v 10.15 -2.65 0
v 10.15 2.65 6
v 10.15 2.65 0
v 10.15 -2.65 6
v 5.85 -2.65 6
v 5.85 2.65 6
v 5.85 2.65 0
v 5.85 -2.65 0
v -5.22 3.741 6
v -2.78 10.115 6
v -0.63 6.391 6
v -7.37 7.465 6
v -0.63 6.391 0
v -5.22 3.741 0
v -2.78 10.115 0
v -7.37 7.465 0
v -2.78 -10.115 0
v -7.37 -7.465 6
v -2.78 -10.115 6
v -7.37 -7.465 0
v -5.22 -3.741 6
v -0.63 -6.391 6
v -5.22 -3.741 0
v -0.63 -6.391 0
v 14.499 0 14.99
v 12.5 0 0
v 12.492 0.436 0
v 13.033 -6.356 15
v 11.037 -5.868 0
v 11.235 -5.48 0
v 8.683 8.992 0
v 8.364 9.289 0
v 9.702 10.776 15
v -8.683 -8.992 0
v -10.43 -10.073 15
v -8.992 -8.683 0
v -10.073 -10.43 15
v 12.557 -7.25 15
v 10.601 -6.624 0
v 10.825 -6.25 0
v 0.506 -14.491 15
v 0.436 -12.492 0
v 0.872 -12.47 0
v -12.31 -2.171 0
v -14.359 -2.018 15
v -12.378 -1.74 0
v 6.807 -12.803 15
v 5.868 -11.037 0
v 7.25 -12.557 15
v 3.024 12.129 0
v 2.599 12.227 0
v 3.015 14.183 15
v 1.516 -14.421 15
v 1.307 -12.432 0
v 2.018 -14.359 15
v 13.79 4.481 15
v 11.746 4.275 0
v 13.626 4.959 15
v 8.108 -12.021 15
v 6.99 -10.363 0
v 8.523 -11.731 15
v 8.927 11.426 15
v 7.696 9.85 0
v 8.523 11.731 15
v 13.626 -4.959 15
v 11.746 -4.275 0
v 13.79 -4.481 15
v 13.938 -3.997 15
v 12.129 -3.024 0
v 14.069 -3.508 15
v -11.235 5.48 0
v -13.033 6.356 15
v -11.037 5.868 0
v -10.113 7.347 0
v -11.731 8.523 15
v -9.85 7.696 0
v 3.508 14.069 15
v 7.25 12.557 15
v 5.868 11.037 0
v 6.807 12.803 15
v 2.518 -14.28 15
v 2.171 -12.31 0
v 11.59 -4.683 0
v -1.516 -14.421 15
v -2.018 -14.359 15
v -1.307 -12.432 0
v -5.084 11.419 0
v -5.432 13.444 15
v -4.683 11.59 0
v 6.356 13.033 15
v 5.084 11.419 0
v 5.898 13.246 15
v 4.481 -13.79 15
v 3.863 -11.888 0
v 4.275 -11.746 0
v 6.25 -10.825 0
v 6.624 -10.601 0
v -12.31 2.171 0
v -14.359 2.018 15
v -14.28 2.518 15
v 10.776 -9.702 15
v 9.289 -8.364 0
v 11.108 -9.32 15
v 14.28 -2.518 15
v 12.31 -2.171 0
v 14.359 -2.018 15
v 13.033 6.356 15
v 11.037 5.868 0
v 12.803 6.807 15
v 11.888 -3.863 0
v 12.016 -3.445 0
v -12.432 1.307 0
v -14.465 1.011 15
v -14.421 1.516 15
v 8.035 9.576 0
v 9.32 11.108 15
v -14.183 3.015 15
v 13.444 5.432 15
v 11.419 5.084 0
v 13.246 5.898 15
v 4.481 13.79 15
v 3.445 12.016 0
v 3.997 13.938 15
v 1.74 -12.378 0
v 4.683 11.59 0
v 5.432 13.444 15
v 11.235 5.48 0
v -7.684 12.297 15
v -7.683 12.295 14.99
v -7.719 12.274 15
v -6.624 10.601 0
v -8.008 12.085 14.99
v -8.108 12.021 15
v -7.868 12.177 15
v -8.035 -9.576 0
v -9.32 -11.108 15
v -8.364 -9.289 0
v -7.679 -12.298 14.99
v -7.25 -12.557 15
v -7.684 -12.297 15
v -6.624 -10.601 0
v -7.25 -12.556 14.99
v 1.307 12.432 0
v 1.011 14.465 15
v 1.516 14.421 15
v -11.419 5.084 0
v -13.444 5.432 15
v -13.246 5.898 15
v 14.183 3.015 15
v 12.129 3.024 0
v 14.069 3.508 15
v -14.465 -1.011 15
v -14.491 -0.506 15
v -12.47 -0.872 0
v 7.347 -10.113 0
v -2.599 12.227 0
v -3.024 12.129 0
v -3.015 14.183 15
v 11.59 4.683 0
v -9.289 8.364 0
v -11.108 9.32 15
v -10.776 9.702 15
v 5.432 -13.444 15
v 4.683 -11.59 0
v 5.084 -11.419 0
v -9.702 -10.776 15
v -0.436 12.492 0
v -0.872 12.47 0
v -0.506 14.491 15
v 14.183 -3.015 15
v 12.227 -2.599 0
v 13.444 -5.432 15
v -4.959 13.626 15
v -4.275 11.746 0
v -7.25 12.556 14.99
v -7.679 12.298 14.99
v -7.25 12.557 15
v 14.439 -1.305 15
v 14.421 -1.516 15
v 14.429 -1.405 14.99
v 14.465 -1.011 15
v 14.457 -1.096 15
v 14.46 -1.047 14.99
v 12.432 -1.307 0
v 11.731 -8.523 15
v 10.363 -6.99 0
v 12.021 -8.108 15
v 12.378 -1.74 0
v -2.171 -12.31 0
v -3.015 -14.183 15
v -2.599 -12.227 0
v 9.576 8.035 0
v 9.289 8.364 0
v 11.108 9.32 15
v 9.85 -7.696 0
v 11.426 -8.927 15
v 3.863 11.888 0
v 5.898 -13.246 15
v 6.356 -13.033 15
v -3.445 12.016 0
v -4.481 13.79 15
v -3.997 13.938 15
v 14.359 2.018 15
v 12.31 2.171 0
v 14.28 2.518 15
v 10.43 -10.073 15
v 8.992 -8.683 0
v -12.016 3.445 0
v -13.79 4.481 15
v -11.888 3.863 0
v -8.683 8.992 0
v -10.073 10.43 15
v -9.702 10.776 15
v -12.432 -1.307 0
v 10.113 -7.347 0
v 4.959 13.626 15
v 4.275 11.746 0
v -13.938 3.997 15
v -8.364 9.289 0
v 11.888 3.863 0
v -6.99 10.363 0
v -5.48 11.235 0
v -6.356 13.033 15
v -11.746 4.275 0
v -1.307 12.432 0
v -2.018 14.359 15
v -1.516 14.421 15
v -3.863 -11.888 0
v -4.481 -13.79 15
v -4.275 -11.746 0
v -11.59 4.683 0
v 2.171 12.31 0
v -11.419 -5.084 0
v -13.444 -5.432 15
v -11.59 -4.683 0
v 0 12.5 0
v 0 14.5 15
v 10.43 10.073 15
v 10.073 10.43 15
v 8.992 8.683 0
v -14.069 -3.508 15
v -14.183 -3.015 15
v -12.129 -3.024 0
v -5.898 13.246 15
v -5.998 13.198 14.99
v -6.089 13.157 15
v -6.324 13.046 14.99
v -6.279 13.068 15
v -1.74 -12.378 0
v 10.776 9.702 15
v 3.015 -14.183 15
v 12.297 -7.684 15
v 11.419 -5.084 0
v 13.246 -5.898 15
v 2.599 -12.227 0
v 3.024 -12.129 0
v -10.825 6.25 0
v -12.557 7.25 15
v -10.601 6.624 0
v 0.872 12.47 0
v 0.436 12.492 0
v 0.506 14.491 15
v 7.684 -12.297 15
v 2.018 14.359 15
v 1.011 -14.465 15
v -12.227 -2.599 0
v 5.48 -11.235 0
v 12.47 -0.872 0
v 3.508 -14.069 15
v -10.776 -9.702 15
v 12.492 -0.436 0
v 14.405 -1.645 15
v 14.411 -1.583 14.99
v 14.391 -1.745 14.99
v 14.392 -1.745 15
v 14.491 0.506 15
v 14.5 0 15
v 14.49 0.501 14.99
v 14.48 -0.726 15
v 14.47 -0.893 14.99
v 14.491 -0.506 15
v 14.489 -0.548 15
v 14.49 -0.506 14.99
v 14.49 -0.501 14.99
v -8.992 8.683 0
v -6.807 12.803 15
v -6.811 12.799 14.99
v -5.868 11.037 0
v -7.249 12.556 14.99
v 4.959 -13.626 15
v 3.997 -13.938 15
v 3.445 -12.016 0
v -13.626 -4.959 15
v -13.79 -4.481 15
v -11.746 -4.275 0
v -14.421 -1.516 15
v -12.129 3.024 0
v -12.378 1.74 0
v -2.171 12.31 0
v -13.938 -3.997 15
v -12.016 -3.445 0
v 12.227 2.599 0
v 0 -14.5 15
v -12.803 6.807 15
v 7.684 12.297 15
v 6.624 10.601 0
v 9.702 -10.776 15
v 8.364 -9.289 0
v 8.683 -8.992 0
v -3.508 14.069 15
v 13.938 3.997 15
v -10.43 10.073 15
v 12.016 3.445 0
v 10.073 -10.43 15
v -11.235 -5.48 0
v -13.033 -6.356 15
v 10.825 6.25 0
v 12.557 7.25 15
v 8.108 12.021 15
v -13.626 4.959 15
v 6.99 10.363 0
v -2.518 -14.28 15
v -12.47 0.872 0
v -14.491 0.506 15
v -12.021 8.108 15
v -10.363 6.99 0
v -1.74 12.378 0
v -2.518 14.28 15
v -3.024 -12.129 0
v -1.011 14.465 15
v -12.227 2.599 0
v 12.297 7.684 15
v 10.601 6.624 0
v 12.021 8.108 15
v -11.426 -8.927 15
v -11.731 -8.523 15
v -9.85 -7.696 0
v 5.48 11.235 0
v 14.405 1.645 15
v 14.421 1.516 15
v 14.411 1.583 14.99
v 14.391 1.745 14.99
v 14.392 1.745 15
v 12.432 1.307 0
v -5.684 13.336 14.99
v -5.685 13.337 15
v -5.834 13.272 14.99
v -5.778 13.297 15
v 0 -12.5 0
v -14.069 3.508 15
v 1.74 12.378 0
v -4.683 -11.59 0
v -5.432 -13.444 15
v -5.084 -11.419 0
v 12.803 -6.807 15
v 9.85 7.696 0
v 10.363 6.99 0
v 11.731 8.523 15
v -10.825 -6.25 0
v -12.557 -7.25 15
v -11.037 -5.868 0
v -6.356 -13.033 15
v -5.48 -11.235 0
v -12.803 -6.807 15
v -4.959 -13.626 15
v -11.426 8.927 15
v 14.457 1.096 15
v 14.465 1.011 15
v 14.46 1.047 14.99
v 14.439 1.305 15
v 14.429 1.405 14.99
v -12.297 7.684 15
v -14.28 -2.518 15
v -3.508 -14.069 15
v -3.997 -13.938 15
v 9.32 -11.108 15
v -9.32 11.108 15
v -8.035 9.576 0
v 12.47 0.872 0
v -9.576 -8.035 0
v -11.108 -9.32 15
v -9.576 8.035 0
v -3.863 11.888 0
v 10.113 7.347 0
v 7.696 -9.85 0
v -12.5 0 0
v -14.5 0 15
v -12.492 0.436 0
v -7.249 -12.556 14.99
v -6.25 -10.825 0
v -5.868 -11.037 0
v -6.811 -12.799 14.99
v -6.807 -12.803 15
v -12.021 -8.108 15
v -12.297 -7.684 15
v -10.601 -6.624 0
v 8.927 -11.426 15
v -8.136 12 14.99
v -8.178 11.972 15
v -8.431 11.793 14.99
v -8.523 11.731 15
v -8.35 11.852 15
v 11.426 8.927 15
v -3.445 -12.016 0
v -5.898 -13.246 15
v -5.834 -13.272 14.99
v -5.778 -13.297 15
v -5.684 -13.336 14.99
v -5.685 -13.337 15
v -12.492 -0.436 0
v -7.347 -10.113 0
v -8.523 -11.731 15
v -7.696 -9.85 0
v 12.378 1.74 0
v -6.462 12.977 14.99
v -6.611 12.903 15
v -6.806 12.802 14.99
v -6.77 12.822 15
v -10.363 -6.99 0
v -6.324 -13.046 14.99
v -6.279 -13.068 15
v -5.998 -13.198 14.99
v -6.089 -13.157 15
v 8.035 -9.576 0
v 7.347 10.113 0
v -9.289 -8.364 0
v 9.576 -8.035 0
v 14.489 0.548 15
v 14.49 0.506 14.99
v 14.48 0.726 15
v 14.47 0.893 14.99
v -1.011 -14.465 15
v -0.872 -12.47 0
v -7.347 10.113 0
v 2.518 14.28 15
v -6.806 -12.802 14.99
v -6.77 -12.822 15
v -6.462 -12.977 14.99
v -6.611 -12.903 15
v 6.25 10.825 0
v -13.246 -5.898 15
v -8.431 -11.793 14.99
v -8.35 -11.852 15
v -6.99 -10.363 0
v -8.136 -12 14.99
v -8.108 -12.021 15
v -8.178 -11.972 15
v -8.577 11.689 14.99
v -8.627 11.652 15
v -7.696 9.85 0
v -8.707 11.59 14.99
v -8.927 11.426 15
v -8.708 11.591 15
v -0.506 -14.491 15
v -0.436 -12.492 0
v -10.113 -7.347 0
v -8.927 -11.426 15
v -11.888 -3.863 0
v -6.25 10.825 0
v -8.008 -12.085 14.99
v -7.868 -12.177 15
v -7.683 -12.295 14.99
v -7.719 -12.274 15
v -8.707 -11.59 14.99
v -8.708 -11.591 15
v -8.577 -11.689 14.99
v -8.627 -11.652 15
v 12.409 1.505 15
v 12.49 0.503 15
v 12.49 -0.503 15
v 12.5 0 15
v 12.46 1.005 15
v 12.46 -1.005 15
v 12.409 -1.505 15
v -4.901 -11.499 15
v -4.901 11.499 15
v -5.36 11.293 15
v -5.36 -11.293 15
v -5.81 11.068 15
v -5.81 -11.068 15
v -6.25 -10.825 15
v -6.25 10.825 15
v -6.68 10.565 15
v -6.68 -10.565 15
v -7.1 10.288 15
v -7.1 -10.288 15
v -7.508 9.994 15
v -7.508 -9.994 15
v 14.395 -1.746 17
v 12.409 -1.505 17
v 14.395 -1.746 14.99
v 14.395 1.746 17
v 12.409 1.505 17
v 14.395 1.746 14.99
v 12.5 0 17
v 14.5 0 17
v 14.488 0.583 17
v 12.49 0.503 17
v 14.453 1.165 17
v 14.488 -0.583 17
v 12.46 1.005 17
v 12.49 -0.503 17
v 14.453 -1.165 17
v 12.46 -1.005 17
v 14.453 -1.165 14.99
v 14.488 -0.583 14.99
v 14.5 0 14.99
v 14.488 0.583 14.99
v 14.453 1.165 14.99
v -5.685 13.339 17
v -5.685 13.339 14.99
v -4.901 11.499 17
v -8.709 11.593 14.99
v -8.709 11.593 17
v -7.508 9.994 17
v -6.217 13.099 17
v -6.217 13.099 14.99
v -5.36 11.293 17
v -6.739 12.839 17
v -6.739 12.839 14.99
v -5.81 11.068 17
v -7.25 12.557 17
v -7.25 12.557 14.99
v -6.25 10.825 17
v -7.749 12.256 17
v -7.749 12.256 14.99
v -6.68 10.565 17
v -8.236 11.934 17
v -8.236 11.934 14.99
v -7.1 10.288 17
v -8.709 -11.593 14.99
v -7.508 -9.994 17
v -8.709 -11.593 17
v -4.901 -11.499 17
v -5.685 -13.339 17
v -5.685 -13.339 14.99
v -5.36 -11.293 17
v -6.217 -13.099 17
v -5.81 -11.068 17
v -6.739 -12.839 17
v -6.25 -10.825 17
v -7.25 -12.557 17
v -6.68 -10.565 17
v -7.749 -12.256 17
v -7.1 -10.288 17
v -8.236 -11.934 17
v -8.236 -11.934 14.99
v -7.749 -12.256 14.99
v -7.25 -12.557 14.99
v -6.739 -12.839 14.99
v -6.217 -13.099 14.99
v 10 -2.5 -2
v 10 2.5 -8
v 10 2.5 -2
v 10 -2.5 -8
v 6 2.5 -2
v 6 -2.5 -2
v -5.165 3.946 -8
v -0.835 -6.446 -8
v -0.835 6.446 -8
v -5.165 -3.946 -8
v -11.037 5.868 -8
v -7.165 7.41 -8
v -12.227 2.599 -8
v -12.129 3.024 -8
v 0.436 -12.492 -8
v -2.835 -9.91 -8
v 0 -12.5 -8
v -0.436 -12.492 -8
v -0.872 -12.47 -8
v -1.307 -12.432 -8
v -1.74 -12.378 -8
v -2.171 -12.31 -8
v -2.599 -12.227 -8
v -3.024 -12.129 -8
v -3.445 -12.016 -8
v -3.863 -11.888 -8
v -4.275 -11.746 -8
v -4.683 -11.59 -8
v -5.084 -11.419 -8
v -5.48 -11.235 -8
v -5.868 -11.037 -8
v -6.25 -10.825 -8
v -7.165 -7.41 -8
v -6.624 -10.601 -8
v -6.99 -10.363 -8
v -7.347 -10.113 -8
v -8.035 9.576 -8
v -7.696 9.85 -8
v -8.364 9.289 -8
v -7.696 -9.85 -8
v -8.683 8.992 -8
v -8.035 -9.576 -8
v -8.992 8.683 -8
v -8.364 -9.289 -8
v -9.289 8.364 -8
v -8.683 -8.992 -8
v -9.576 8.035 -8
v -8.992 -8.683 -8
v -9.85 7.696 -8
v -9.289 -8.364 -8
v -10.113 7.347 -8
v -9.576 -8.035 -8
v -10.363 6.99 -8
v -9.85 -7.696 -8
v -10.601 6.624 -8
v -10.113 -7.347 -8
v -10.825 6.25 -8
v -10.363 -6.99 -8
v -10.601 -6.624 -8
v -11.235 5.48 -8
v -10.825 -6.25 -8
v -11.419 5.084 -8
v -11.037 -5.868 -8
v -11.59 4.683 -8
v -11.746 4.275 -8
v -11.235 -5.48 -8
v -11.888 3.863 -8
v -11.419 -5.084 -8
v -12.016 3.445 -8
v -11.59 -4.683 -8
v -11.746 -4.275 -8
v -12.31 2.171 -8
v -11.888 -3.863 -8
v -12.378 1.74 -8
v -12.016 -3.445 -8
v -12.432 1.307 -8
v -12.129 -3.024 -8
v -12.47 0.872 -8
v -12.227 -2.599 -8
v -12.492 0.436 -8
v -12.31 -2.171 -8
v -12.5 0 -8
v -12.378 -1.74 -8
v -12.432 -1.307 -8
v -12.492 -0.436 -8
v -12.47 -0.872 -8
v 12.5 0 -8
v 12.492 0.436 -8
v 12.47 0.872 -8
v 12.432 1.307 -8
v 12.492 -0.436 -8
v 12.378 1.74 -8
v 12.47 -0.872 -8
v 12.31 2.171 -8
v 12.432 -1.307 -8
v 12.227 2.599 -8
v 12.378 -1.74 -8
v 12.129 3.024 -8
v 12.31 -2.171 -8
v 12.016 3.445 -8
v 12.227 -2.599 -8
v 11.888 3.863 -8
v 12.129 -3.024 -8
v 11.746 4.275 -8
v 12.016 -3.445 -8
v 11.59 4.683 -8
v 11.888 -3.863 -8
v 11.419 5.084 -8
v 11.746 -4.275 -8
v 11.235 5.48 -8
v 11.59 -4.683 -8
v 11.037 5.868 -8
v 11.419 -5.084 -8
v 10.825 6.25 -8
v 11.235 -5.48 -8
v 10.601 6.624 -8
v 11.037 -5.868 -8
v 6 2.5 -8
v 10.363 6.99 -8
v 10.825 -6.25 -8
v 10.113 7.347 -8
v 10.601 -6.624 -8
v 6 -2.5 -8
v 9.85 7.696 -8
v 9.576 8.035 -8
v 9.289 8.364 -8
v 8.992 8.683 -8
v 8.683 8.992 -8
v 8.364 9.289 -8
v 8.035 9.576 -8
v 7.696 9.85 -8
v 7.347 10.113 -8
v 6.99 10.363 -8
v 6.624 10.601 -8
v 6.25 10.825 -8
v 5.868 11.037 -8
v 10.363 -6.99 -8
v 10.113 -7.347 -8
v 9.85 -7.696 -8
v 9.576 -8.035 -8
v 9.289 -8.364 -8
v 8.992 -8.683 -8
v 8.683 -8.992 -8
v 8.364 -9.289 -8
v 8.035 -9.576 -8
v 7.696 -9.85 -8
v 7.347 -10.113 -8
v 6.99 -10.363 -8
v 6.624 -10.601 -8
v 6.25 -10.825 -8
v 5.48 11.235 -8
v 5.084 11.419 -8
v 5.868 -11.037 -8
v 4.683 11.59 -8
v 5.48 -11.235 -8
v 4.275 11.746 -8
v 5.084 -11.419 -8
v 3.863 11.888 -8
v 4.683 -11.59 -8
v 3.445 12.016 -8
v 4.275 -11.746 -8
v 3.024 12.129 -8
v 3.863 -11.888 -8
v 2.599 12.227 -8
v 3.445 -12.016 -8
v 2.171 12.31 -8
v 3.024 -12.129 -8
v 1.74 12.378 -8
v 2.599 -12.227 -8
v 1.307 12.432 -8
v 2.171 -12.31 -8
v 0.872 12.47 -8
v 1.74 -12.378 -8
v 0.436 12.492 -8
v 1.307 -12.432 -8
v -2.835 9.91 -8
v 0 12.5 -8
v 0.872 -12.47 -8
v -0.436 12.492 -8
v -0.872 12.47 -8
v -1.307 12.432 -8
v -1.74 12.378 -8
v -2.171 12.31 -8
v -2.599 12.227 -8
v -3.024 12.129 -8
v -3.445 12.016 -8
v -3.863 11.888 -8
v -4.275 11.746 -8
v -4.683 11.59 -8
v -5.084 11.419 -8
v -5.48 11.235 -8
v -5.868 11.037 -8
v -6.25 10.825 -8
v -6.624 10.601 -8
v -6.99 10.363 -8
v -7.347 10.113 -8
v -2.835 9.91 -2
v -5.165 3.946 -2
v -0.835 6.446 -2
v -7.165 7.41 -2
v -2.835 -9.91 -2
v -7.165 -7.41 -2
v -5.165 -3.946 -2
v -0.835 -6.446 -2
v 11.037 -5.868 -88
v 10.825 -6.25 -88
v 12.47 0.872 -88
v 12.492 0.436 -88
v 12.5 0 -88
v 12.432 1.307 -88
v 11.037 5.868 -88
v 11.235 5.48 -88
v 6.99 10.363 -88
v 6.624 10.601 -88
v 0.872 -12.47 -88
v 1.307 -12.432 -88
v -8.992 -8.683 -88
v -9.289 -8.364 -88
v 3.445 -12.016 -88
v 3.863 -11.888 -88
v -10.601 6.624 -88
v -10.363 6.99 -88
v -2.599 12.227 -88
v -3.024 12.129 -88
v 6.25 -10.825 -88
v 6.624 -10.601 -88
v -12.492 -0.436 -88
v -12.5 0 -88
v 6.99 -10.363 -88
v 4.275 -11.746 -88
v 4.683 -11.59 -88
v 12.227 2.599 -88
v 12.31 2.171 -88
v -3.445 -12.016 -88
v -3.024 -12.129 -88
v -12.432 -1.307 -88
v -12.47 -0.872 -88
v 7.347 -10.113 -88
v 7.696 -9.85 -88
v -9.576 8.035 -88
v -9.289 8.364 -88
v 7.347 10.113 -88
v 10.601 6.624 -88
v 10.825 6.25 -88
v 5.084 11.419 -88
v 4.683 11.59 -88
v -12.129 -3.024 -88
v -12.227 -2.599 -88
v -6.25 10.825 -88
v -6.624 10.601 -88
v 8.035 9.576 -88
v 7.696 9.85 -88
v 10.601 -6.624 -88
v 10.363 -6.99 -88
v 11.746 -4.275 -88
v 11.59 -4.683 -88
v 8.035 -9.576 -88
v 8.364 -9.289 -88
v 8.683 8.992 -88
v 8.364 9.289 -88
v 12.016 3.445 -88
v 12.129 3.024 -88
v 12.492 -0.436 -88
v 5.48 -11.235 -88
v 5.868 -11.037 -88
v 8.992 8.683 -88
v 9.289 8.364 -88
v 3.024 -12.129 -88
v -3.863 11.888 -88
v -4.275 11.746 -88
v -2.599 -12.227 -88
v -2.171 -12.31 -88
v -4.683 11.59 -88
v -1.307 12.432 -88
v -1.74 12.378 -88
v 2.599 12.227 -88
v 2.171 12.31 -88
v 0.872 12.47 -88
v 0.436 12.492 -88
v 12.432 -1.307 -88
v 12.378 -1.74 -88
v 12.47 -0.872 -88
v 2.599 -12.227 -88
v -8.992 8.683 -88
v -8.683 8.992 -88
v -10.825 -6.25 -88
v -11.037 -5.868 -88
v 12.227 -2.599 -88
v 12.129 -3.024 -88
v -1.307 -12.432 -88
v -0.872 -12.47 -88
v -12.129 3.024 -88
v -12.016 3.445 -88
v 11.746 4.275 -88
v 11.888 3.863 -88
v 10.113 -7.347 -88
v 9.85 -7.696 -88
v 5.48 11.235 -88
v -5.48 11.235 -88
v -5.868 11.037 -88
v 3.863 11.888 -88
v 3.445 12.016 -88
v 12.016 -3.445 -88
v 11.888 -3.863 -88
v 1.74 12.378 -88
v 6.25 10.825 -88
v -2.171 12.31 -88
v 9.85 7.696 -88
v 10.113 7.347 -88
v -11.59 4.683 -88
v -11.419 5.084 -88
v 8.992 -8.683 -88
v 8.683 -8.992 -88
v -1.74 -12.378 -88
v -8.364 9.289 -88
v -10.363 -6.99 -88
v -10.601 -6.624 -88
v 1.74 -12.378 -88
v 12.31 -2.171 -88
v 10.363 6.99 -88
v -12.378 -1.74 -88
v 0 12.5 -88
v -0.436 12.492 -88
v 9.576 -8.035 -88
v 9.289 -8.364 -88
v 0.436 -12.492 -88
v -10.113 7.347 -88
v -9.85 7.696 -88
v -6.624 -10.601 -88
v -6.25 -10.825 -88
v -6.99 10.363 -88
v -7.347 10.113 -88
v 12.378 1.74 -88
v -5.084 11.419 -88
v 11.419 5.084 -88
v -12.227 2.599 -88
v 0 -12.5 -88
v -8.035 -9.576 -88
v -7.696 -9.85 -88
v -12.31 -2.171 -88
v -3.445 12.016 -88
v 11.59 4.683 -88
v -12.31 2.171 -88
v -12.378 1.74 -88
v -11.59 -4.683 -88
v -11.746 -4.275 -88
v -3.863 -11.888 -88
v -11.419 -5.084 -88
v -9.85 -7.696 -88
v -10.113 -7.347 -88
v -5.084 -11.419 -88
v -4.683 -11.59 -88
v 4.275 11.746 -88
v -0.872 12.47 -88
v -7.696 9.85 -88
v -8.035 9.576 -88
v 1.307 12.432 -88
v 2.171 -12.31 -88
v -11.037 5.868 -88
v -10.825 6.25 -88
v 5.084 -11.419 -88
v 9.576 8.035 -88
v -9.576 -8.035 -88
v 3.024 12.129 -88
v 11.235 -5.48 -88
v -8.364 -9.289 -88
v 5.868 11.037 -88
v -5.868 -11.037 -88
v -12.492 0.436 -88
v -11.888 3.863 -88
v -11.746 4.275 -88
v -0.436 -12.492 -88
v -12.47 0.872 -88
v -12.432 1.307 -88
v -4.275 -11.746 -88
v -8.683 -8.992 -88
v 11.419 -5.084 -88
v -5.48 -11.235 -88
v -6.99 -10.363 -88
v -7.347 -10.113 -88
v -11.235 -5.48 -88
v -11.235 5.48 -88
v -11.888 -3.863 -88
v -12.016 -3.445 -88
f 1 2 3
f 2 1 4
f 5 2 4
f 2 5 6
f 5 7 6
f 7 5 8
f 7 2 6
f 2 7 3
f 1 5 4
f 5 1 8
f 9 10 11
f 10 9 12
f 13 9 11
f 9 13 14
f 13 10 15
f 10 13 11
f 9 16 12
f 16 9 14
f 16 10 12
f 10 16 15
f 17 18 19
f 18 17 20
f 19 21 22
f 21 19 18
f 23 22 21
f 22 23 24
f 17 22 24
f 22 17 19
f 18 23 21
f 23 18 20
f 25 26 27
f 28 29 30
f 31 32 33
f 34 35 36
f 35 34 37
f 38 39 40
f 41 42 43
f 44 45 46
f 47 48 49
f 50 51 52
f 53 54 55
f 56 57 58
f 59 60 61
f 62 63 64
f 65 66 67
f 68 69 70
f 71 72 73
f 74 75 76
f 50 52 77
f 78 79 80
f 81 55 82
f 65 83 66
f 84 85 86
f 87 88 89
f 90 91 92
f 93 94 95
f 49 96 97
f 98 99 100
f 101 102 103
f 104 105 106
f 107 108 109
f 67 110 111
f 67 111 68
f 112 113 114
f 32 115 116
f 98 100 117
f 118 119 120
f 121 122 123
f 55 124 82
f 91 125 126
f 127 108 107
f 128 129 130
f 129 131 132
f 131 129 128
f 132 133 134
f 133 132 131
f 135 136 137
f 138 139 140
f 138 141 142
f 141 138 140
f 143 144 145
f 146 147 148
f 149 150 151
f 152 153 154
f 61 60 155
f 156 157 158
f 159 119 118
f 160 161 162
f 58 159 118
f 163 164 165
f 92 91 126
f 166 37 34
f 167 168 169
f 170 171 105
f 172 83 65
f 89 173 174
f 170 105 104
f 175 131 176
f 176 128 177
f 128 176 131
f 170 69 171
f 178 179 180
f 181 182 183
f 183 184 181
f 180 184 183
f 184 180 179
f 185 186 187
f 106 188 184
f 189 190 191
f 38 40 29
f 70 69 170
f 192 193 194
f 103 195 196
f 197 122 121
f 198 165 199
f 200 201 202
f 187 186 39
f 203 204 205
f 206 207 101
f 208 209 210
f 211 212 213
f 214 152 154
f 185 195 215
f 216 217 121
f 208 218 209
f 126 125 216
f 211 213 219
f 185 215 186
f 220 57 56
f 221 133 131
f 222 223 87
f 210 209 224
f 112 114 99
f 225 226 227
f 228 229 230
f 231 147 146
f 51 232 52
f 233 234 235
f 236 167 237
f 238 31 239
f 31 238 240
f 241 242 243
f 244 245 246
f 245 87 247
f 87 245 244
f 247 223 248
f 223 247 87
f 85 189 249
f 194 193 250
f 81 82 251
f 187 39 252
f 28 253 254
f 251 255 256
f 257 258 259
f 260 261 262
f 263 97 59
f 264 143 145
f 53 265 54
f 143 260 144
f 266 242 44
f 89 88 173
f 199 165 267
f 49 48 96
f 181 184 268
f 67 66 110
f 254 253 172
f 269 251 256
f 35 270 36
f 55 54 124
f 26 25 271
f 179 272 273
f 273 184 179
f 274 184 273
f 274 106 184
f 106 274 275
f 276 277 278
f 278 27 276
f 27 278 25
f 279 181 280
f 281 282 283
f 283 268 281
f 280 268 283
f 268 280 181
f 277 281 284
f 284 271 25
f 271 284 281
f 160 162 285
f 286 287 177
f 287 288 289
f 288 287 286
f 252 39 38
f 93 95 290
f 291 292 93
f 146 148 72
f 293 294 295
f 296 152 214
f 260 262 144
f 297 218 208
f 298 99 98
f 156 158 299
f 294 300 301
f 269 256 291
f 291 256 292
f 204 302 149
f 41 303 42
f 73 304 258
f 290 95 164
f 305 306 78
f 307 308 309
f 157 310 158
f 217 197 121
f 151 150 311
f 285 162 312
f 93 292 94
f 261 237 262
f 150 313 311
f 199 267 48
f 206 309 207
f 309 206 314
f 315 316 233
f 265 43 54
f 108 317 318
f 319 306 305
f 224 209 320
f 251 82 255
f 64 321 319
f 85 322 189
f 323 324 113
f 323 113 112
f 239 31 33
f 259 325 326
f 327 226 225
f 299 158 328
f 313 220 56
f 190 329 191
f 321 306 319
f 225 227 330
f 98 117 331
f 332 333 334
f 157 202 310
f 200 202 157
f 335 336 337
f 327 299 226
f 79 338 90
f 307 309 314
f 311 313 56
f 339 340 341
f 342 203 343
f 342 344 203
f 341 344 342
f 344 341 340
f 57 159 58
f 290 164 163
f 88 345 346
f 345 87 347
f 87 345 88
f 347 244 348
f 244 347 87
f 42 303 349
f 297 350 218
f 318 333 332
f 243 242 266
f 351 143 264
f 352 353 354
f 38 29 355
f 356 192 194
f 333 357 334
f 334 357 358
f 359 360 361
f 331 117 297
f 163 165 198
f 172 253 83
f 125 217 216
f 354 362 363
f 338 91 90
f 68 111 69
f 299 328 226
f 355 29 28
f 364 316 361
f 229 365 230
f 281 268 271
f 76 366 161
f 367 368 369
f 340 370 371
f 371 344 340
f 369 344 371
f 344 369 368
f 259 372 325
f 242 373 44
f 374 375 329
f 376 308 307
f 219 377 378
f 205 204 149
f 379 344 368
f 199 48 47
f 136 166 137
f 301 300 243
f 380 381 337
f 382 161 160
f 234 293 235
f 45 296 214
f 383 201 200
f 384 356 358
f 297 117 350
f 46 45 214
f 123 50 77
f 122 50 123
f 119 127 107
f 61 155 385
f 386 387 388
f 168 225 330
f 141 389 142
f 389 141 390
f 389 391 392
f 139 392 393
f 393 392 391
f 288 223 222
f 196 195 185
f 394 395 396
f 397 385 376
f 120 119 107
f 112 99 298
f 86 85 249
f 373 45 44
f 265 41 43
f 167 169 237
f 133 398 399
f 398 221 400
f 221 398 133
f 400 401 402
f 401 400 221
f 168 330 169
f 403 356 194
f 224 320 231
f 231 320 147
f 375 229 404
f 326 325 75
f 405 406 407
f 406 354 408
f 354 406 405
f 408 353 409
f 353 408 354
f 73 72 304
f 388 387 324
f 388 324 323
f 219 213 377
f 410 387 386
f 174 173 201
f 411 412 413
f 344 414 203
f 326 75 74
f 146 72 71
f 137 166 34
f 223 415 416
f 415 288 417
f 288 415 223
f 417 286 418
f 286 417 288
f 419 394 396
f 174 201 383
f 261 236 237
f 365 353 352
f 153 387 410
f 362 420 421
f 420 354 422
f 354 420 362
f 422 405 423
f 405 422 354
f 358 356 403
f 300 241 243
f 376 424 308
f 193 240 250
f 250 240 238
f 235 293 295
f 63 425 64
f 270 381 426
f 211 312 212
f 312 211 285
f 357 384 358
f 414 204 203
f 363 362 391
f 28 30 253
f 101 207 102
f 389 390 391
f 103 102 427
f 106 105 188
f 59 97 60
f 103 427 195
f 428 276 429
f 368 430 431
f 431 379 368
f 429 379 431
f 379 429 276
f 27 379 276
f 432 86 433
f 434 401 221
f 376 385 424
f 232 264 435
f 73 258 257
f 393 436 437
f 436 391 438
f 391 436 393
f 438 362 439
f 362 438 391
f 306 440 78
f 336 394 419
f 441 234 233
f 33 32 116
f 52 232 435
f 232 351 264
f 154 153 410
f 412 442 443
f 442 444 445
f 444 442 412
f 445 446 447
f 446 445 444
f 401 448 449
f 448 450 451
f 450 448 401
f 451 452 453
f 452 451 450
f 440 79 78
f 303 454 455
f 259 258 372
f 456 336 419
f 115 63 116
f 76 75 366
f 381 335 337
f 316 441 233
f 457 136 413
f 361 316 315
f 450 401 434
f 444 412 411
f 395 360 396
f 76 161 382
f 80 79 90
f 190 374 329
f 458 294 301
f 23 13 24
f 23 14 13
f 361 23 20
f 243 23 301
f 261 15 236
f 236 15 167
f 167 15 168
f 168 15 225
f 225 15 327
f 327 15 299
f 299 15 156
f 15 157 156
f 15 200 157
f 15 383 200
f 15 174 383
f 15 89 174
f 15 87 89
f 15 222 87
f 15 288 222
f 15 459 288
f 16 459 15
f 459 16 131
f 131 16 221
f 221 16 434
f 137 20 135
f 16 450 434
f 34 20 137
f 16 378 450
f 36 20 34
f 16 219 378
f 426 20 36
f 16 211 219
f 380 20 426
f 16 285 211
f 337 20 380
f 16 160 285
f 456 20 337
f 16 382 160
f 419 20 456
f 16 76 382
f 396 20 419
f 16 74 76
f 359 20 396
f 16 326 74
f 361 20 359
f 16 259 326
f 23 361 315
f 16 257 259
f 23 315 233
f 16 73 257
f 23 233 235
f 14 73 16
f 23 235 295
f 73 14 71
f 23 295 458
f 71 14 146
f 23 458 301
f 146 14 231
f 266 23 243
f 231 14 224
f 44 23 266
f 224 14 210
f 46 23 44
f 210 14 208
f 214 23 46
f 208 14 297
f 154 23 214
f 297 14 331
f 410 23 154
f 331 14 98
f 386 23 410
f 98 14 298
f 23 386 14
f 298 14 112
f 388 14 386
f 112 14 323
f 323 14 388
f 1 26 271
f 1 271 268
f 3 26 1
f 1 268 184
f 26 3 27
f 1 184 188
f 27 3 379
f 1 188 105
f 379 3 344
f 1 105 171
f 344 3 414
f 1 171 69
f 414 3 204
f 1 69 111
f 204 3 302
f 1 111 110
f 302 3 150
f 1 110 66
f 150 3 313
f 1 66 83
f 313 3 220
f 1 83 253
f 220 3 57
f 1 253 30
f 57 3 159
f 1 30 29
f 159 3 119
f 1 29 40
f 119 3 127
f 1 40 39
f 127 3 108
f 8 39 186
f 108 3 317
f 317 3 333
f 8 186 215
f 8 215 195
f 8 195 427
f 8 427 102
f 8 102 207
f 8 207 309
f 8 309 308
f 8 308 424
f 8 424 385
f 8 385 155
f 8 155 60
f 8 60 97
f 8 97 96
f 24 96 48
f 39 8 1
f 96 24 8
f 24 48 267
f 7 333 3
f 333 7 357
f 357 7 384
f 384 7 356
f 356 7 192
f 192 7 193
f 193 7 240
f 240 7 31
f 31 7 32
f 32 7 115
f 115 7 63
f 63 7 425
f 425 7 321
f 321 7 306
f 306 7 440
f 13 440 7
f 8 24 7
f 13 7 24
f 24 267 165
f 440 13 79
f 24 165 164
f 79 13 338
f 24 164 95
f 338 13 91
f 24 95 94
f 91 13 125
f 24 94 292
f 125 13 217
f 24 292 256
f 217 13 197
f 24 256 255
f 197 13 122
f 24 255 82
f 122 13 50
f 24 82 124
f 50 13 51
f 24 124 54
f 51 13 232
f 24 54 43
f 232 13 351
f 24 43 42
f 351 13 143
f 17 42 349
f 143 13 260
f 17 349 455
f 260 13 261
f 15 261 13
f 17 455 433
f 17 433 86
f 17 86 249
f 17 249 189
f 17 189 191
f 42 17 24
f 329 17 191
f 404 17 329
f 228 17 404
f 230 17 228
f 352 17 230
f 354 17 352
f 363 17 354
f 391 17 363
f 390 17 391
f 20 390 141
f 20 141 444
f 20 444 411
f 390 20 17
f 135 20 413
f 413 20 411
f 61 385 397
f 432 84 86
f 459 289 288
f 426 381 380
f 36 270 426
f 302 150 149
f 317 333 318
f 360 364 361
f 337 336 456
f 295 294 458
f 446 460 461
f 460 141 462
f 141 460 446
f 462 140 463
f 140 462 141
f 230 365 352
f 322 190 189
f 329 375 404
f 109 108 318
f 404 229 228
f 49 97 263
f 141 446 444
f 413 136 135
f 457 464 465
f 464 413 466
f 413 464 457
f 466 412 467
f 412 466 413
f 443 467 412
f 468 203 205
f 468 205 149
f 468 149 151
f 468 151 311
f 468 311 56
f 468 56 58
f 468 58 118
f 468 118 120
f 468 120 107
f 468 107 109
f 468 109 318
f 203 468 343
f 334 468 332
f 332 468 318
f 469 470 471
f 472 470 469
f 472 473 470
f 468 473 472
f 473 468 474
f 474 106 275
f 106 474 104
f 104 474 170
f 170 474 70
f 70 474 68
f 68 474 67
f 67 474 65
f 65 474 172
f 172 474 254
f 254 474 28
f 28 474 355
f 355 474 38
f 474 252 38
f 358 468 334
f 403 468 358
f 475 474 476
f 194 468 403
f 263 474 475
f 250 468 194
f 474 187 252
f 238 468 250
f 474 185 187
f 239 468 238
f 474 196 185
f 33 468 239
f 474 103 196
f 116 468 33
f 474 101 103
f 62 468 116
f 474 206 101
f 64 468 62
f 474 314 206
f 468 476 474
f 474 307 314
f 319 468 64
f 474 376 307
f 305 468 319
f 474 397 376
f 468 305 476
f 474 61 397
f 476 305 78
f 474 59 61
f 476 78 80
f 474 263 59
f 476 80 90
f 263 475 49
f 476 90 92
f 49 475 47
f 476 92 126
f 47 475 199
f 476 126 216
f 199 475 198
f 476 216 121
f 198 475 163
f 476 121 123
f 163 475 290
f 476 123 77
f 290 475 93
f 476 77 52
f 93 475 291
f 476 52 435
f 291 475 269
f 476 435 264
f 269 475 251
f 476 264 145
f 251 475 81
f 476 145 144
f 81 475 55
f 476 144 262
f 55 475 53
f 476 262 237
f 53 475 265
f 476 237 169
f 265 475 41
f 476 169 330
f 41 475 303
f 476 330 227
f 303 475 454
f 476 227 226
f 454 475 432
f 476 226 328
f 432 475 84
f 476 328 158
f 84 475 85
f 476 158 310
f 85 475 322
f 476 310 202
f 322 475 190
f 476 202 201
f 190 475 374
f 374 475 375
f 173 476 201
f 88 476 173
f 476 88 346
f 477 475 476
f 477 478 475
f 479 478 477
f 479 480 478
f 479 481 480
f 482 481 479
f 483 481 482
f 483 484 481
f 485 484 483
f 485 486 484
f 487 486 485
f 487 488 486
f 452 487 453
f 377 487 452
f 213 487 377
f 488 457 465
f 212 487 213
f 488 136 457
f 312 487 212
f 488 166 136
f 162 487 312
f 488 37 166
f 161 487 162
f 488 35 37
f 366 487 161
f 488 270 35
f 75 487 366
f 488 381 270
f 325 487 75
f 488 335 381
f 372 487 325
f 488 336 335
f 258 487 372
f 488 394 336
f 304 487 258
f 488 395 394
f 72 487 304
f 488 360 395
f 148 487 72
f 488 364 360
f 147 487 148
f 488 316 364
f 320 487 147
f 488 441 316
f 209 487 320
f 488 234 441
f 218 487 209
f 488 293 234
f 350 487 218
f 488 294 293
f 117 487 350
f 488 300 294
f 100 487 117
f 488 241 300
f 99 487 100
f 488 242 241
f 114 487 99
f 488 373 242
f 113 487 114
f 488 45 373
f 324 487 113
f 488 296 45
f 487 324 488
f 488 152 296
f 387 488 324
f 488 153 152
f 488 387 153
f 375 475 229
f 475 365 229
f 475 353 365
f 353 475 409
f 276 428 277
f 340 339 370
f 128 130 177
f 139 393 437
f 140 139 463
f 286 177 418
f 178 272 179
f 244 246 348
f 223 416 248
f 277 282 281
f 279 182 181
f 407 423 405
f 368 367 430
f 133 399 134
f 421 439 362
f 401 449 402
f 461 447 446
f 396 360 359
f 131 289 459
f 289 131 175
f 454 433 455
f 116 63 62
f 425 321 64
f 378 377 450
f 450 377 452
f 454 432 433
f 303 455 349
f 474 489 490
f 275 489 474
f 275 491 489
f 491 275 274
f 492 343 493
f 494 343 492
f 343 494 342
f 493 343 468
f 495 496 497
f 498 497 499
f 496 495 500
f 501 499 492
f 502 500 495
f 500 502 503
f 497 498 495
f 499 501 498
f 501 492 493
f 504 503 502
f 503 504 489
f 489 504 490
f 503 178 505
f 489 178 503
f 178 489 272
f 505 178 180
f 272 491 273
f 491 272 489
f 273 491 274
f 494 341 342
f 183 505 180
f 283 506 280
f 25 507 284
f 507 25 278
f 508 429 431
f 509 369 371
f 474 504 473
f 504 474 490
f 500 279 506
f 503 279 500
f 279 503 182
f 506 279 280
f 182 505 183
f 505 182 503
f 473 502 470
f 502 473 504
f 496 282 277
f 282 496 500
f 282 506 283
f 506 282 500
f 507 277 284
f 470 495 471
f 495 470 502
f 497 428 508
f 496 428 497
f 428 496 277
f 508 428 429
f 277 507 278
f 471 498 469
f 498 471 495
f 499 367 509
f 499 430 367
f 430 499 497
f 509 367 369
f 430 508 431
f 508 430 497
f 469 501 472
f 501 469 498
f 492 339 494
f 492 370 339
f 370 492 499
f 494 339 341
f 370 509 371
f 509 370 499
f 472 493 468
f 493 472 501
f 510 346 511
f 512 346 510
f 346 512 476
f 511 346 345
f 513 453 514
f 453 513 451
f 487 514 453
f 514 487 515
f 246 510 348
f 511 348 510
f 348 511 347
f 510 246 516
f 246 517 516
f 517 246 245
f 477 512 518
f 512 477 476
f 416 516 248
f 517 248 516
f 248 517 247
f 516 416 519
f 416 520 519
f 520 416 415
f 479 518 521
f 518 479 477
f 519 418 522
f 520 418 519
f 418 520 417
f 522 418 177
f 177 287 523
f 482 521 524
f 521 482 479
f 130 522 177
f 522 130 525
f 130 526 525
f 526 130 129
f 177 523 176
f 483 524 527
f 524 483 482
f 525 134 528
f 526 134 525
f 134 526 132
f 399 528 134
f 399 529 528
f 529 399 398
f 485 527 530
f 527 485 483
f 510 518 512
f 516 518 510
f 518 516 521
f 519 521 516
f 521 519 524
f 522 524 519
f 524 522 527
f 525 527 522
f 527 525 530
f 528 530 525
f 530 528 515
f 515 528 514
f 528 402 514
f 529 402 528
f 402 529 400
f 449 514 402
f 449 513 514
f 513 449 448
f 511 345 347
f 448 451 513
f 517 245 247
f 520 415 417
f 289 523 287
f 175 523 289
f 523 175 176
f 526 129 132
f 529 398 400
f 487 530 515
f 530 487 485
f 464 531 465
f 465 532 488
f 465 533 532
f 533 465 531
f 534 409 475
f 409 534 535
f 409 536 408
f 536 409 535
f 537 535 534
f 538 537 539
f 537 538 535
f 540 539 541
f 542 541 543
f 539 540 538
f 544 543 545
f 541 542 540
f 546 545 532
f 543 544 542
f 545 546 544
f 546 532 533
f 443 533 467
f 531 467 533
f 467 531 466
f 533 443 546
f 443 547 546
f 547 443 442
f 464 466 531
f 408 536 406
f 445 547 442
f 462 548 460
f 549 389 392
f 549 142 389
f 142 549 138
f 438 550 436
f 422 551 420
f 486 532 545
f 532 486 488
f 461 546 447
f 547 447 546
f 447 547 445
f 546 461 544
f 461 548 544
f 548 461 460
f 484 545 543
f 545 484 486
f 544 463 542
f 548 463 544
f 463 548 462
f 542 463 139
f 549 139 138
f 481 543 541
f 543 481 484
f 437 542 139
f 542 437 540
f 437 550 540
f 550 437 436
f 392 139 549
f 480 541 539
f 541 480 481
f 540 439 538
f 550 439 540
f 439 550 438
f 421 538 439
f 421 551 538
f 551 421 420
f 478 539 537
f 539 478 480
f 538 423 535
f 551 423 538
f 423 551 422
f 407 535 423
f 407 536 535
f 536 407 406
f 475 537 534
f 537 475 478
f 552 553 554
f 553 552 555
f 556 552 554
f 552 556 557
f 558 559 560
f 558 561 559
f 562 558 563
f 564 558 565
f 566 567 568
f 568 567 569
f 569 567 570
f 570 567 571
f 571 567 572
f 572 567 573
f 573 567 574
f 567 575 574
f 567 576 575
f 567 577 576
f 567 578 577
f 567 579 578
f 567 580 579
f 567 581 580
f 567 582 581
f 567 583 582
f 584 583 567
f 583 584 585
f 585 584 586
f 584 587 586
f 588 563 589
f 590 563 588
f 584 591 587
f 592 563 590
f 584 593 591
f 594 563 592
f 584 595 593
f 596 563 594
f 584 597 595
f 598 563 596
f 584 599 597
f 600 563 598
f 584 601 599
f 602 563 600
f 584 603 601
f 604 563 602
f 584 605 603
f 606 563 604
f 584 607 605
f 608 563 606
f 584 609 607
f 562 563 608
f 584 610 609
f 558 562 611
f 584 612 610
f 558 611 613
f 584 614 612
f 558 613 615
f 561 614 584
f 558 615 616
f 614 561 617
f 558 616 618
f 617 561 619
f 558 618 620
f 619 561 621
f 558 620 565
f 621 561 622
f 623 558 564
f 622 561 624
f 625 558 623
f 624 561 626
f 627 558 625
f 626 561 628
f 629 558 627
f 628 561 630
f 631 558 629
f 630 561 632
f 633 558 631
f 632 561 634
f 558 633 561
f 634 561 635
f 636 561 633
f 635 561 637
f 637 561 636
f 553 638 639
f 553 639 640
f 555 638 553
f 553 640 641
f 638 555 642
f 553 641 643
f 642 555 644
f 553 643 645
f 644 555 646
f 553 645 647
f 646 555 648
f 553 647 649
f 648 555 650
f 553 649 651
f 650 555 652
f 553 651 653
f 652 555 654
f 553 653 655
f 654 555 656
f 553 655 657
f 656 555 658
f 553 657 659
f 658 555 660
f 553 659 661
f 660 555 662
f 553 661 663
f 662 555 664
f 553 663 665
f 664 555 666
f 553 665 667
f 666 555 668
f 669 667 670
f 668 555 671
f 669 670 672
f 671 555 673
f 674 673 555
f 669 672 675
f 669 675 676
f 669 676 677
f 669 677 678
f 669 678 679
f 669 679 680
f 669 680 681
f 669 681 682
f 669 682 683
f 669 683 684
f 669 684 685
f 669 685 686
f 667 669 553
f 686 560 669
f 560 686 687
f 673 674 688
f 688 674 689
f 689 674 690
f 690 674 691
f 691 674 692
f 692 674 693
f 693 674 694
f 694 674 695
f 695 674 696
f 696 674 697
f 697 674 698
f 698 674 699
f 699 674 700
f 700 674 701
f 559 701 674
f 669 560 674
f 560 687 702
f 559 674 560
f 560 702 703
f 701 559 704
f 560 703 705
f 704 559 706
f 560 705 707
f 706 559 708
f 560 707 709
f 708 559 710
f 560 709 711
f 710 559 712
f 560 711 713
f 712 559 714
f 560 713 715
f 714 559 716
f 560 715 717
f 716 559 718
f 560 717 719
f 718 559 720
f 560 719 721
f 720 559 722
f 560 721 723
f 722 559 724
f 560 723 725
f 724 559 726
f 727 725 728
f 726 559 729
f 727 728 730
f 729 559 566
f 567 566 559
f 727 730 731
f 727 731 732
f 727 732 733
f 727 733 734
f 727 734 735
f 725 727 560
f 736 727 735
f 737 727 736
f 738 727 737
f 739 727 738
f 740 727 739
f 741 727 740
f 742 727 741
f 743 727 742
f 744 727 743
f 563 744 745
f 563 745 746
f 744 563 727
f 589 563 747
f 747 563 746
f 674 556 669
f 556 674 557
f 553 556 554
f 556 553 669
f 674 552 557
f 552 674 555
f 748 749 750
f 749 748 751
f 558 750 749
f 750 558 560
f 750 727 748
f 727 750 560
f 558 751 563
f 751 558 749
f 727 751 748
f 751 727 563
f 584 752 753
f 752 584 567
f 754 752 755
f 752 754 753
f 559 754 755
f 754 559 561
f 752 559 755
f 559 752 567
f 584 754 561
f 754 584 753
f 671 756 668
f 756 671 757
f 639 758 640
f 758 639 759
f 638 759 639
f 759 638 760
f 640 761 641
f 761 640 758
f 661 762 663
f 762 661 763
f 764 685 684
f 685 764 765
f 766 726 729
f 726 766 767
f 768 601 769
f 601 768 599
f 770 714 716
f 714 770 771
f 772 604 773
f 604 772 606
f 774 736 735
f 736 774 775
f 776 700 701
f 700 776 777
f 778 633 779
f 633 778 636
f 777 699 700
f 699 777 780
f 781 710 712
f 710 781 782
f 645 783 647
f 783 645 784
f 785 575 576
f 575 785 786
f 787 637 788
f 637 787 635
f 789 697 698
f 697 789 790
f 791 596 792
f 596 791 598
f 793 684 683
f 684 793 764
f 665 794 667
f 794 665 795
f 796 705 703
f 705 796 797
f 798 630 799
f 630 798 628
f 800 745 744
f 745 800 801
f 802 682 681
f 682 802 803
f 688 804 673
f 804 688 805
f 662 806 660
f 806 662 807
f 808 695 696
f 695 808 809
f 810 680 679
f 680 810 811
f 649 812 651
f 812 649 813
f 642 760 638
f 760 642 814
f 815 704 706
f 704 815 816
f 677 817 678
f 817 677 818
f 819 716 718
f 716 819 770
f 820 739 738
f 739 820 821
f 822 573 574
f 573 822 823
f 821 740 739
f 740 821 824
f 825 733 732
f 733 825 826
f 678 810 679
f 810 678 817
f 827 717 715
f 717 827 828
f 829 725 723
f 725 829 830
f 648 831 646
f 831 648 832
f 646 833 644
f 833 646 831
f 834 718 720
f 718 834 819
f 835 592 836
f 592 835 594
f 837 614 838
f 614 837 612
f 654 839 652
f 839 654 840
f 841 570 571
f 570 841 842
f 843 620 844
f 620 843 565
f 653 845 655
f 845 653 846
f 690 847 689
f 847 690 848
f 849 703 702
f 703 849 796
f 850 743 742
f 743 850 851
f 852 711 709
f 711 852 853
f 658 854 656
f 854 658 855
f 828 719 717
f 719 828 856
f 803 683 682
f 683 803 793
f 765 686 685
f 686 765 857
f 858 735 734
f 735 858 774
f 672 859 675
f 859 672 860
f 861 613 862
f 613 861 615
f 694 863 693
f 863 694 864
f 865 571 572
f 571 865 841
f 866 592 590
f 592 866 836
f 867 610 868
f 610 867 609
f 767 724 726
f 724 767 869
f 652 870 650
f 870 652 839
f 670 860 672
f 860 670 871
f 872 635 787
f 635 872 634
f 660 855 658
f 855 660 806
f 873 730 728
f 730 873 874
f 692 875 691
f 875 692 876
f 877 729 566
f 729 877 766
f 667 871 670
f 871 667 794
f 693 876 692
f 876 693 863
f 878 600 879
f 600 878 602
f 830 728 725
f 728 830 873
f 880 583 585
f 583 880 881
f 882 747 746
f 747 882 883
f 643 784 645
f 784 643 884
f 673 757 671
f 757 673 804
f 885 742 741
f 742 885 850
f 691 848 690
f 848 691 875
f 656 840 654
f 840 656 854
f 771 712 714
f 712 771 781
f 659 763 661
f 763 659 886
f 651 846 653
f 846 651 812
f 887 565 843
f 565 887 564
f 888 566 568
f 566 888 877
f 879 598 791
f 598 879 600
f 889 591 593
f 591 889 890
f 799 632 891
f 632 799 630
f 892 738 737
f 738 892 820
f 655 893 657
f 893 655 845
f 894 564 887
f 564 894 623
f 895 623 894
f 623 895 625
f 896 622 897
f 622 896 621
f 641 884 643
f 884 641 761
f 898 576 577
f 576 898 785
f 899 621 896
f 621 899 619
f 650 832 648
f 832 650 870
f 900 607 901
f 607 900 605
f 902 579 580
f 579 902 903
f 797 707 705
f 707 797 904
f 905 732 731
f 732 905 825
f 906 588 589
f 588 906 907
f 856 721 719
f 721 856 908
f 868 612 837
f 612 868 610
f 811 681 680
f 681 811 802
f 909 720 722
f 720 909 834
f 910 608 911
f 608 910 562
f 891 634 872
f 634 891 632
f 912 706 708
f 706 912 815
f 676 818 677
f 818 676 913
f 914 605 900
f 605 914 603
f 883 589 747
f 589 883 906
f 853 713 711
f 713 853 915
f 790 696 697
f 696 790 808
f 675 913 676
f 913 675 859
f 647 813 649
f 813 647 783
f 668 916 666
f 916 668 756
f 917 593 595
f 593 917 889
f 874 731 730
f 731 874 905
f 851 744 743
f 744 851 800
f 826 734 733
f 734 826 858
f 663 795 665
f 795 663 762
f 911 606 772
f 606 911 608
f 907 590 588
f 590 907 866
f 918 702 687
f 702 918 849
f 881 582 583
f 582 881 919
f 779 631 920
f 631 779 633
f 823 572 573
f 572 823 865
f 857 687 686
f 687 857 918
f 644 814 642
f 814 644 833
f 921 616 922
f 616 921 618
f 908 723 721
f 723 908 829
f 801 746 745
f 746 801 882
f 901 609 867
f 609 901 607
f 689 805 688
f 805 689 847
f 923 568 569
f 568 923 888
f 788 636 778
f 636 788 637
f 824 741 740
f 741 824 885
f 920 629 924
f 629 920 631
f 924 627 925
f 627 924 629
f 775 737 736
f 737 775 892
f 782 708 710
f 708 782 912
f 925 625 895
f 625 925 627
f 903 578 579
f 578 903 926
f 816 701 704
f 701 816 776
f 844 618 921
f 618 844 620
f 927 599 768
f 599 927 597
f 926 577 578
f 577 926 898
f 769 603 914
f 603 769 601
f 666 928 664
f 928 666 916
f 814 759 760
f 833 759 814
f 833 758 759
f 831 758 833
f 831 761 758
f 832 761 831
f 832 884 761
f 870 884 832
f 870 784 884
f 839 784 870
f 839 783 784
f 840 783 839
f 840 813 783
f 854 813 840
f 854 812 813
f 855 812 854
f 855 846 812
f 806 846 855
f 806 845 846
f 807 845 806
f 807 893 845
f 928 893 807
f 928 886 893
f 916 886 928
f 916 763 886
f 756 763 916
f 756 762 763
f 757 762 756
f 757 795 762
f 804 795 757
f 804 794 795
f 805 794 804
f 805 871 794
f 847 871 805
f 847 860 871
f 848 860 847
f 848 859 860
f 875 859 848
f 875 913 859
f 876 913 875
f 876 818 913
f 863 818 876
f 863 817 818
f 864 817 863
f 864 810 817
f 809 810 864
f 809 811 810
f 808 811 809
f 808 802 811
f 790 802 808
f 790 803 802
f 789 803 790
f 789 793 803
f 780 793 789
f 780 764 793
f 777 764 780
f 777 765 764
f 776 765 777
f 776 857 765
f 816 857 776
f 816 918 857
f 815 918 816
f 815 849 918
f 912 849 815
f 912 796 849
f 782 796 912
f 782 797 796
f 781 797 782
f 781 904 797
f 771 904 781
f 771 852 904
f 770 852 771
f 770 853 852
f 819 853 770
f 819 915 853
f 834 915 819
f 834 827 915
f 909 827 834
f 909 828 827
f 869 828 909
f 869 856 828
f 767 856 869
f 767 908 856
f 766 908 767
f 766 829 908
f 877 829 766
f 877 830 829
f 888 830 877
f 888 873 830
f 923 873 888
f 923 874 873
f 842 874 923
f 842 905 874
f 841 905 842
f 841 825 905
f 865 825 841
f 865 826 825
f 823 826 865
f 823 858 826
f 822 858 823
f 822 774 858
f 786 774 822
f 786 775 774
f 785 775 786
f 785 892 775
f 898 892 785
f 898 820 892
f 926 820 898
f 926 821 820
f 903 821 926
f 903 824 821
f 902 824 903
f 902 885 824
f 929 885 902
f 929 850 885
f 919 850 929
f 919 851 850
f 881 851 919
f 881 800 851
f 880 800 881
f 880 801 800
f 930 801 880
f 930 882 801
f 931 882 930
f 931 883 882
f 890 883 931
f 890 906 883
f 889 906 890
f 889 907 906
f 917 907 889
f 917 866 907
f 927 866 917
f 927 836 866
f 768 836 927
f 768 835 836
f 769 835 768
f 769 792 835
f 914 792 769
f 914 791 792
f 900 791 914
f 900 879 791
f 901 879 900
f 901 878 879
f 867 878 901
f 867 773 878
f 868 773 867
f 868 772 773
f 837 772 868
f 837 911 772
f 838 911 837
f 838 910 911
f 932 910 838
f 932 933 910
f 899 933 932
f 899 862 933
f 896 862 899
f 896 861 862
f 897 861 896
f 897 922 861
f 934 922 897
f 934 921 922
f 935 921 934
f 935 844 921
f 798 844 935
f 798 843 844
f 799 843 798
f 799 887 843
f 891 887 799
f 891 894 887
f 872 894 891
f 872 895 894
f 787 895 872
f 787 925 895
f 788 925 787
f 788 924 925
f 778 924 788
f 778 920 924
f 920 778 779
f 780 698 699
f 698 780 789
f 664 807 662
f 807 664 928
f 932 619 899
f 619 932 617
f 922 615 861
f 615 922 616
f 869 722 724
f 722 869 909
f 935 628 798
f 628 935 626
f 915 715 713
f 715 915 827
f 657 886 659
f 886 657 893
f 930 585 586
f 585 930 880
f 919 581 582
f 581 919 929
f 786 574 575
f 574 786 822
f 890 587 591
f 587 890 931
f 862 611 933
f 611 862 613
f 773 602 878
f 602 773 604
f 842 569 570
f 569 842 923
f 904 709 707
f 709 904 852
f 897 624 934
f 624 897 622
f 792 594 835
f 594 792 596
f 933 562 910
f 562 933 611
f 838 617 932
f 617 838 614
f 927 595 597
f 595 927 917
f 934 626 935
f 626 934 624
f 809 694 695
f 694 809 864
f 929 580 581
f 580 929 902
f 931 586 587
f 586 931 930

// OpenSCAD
// ============================================================
// Hayward ColorLogic Accent Light Installation Tool – End Piece
// ============================================================

// ----- Constants & Parameters -----
disc_diameter   = 29;     // mm – outer diameter of the circular end
disc_thickness  = 15;     // mm – depth (Z) of the flat disc

prong_height    = 2;      // mm – how far prongs extend above the disc
prong_arc_len   = 3.5;    // mm – arc length of each prong along circumference
prong_width     = 2;      // mm – radial thickness of each prong (adjustable)
prong_count     = 3;

// Handle parameters
handle_diameter = 25;     // mm
handle_length   = 80;     // mm
handle_gap      = 2;      // mm – visual gap between handle and disc

// Interlocking tab parameters
tab_count       = 3;
tab_width       = 5;      // mm – width tangentially
tab_depth       = 4;      // mm – radial depth of each tab
tab_height      = 6;      // mm – how far tabs protrude into the disc
tab_radial_pos  = 8;      // mm – distance from center to tab center
tab_clearance   = 0.15;   // mm – press-fit tolerance per side

// ----- Derived Dimensions -----
disc_radius     = disc_diameter / 2;
handle_radius   = handle_diameter / 2;
prong_arc_angle = (prong_arc_len / (PI * disc_diameter)) * 360; // degrees
eps             = 0.01;   // mm – tiny overlap to avoid z-fighting

// Slot dimensions (tab + clearance on each side)
slot_width      = tab_width + 2 * tab_clearance;
slot_depth      = tab_depth + 2 * tab_clearance;

// ----- Quality -----
$fn = 180;

// ----- Component Modules -----

module disc() {
    cylinder(d1 = handle_diameter, d2 = disc_diameter, h = disc_thickness);
}

module prong() {
    rotate_extrude(angle = prong_arc_angle)
        translate([disc_radius - prong_width, 0])
            square([prong_width, prong_height + eps]);
}

module prongs() {
    for (i = [0 : prong_count - 1])
        rotate([0, 0, i * (360 / prong_count) - prong_arc_angle / 2])
            translate([0, 0, disc_thickness - eps])
                prong();
}

// Cutout slots in the bottom of the disc for the handle tabs
module disc_slots() {
    for (i = [0 : tab_count - 1])
        rotate([0, 0, i * (360 / tab_count)])
            translate([tab_radial_pos - slot_depth / 2,
                       -slot_width / 2,
                       -eps])
                cube([slot_depth, slot_width, tab_height + eps]);
}

// The disc with slots cut out of the bottom face
module end_piece() {
    difference() {
        disc();
        disc_slots();
    }
    prongs();
}

// Tabs that protrude from the top of the handle
module handle_tabs() {
    for (i = [0 : tab_count - 1])
        rotate([0, 0, i * (360 / tab_count)])
            translate([tab_radial_pos - tab_depth / 2,
                       -tab_width / 2,
                       handle_length])
                cube([tab_depth, tab_width, tab_height]);
}

module handle() {
    cylinder(d = handle_diameter, h = handle_length);
    handle_tabs();
}

// ----- Assembly -----
// End piece at origin, prongs pointing up
end_piece();

// Handle positioned below the disc with a small visual gap
translate([0, 0, -(handle_length + tab_height + handle_gap)])
    handle();
